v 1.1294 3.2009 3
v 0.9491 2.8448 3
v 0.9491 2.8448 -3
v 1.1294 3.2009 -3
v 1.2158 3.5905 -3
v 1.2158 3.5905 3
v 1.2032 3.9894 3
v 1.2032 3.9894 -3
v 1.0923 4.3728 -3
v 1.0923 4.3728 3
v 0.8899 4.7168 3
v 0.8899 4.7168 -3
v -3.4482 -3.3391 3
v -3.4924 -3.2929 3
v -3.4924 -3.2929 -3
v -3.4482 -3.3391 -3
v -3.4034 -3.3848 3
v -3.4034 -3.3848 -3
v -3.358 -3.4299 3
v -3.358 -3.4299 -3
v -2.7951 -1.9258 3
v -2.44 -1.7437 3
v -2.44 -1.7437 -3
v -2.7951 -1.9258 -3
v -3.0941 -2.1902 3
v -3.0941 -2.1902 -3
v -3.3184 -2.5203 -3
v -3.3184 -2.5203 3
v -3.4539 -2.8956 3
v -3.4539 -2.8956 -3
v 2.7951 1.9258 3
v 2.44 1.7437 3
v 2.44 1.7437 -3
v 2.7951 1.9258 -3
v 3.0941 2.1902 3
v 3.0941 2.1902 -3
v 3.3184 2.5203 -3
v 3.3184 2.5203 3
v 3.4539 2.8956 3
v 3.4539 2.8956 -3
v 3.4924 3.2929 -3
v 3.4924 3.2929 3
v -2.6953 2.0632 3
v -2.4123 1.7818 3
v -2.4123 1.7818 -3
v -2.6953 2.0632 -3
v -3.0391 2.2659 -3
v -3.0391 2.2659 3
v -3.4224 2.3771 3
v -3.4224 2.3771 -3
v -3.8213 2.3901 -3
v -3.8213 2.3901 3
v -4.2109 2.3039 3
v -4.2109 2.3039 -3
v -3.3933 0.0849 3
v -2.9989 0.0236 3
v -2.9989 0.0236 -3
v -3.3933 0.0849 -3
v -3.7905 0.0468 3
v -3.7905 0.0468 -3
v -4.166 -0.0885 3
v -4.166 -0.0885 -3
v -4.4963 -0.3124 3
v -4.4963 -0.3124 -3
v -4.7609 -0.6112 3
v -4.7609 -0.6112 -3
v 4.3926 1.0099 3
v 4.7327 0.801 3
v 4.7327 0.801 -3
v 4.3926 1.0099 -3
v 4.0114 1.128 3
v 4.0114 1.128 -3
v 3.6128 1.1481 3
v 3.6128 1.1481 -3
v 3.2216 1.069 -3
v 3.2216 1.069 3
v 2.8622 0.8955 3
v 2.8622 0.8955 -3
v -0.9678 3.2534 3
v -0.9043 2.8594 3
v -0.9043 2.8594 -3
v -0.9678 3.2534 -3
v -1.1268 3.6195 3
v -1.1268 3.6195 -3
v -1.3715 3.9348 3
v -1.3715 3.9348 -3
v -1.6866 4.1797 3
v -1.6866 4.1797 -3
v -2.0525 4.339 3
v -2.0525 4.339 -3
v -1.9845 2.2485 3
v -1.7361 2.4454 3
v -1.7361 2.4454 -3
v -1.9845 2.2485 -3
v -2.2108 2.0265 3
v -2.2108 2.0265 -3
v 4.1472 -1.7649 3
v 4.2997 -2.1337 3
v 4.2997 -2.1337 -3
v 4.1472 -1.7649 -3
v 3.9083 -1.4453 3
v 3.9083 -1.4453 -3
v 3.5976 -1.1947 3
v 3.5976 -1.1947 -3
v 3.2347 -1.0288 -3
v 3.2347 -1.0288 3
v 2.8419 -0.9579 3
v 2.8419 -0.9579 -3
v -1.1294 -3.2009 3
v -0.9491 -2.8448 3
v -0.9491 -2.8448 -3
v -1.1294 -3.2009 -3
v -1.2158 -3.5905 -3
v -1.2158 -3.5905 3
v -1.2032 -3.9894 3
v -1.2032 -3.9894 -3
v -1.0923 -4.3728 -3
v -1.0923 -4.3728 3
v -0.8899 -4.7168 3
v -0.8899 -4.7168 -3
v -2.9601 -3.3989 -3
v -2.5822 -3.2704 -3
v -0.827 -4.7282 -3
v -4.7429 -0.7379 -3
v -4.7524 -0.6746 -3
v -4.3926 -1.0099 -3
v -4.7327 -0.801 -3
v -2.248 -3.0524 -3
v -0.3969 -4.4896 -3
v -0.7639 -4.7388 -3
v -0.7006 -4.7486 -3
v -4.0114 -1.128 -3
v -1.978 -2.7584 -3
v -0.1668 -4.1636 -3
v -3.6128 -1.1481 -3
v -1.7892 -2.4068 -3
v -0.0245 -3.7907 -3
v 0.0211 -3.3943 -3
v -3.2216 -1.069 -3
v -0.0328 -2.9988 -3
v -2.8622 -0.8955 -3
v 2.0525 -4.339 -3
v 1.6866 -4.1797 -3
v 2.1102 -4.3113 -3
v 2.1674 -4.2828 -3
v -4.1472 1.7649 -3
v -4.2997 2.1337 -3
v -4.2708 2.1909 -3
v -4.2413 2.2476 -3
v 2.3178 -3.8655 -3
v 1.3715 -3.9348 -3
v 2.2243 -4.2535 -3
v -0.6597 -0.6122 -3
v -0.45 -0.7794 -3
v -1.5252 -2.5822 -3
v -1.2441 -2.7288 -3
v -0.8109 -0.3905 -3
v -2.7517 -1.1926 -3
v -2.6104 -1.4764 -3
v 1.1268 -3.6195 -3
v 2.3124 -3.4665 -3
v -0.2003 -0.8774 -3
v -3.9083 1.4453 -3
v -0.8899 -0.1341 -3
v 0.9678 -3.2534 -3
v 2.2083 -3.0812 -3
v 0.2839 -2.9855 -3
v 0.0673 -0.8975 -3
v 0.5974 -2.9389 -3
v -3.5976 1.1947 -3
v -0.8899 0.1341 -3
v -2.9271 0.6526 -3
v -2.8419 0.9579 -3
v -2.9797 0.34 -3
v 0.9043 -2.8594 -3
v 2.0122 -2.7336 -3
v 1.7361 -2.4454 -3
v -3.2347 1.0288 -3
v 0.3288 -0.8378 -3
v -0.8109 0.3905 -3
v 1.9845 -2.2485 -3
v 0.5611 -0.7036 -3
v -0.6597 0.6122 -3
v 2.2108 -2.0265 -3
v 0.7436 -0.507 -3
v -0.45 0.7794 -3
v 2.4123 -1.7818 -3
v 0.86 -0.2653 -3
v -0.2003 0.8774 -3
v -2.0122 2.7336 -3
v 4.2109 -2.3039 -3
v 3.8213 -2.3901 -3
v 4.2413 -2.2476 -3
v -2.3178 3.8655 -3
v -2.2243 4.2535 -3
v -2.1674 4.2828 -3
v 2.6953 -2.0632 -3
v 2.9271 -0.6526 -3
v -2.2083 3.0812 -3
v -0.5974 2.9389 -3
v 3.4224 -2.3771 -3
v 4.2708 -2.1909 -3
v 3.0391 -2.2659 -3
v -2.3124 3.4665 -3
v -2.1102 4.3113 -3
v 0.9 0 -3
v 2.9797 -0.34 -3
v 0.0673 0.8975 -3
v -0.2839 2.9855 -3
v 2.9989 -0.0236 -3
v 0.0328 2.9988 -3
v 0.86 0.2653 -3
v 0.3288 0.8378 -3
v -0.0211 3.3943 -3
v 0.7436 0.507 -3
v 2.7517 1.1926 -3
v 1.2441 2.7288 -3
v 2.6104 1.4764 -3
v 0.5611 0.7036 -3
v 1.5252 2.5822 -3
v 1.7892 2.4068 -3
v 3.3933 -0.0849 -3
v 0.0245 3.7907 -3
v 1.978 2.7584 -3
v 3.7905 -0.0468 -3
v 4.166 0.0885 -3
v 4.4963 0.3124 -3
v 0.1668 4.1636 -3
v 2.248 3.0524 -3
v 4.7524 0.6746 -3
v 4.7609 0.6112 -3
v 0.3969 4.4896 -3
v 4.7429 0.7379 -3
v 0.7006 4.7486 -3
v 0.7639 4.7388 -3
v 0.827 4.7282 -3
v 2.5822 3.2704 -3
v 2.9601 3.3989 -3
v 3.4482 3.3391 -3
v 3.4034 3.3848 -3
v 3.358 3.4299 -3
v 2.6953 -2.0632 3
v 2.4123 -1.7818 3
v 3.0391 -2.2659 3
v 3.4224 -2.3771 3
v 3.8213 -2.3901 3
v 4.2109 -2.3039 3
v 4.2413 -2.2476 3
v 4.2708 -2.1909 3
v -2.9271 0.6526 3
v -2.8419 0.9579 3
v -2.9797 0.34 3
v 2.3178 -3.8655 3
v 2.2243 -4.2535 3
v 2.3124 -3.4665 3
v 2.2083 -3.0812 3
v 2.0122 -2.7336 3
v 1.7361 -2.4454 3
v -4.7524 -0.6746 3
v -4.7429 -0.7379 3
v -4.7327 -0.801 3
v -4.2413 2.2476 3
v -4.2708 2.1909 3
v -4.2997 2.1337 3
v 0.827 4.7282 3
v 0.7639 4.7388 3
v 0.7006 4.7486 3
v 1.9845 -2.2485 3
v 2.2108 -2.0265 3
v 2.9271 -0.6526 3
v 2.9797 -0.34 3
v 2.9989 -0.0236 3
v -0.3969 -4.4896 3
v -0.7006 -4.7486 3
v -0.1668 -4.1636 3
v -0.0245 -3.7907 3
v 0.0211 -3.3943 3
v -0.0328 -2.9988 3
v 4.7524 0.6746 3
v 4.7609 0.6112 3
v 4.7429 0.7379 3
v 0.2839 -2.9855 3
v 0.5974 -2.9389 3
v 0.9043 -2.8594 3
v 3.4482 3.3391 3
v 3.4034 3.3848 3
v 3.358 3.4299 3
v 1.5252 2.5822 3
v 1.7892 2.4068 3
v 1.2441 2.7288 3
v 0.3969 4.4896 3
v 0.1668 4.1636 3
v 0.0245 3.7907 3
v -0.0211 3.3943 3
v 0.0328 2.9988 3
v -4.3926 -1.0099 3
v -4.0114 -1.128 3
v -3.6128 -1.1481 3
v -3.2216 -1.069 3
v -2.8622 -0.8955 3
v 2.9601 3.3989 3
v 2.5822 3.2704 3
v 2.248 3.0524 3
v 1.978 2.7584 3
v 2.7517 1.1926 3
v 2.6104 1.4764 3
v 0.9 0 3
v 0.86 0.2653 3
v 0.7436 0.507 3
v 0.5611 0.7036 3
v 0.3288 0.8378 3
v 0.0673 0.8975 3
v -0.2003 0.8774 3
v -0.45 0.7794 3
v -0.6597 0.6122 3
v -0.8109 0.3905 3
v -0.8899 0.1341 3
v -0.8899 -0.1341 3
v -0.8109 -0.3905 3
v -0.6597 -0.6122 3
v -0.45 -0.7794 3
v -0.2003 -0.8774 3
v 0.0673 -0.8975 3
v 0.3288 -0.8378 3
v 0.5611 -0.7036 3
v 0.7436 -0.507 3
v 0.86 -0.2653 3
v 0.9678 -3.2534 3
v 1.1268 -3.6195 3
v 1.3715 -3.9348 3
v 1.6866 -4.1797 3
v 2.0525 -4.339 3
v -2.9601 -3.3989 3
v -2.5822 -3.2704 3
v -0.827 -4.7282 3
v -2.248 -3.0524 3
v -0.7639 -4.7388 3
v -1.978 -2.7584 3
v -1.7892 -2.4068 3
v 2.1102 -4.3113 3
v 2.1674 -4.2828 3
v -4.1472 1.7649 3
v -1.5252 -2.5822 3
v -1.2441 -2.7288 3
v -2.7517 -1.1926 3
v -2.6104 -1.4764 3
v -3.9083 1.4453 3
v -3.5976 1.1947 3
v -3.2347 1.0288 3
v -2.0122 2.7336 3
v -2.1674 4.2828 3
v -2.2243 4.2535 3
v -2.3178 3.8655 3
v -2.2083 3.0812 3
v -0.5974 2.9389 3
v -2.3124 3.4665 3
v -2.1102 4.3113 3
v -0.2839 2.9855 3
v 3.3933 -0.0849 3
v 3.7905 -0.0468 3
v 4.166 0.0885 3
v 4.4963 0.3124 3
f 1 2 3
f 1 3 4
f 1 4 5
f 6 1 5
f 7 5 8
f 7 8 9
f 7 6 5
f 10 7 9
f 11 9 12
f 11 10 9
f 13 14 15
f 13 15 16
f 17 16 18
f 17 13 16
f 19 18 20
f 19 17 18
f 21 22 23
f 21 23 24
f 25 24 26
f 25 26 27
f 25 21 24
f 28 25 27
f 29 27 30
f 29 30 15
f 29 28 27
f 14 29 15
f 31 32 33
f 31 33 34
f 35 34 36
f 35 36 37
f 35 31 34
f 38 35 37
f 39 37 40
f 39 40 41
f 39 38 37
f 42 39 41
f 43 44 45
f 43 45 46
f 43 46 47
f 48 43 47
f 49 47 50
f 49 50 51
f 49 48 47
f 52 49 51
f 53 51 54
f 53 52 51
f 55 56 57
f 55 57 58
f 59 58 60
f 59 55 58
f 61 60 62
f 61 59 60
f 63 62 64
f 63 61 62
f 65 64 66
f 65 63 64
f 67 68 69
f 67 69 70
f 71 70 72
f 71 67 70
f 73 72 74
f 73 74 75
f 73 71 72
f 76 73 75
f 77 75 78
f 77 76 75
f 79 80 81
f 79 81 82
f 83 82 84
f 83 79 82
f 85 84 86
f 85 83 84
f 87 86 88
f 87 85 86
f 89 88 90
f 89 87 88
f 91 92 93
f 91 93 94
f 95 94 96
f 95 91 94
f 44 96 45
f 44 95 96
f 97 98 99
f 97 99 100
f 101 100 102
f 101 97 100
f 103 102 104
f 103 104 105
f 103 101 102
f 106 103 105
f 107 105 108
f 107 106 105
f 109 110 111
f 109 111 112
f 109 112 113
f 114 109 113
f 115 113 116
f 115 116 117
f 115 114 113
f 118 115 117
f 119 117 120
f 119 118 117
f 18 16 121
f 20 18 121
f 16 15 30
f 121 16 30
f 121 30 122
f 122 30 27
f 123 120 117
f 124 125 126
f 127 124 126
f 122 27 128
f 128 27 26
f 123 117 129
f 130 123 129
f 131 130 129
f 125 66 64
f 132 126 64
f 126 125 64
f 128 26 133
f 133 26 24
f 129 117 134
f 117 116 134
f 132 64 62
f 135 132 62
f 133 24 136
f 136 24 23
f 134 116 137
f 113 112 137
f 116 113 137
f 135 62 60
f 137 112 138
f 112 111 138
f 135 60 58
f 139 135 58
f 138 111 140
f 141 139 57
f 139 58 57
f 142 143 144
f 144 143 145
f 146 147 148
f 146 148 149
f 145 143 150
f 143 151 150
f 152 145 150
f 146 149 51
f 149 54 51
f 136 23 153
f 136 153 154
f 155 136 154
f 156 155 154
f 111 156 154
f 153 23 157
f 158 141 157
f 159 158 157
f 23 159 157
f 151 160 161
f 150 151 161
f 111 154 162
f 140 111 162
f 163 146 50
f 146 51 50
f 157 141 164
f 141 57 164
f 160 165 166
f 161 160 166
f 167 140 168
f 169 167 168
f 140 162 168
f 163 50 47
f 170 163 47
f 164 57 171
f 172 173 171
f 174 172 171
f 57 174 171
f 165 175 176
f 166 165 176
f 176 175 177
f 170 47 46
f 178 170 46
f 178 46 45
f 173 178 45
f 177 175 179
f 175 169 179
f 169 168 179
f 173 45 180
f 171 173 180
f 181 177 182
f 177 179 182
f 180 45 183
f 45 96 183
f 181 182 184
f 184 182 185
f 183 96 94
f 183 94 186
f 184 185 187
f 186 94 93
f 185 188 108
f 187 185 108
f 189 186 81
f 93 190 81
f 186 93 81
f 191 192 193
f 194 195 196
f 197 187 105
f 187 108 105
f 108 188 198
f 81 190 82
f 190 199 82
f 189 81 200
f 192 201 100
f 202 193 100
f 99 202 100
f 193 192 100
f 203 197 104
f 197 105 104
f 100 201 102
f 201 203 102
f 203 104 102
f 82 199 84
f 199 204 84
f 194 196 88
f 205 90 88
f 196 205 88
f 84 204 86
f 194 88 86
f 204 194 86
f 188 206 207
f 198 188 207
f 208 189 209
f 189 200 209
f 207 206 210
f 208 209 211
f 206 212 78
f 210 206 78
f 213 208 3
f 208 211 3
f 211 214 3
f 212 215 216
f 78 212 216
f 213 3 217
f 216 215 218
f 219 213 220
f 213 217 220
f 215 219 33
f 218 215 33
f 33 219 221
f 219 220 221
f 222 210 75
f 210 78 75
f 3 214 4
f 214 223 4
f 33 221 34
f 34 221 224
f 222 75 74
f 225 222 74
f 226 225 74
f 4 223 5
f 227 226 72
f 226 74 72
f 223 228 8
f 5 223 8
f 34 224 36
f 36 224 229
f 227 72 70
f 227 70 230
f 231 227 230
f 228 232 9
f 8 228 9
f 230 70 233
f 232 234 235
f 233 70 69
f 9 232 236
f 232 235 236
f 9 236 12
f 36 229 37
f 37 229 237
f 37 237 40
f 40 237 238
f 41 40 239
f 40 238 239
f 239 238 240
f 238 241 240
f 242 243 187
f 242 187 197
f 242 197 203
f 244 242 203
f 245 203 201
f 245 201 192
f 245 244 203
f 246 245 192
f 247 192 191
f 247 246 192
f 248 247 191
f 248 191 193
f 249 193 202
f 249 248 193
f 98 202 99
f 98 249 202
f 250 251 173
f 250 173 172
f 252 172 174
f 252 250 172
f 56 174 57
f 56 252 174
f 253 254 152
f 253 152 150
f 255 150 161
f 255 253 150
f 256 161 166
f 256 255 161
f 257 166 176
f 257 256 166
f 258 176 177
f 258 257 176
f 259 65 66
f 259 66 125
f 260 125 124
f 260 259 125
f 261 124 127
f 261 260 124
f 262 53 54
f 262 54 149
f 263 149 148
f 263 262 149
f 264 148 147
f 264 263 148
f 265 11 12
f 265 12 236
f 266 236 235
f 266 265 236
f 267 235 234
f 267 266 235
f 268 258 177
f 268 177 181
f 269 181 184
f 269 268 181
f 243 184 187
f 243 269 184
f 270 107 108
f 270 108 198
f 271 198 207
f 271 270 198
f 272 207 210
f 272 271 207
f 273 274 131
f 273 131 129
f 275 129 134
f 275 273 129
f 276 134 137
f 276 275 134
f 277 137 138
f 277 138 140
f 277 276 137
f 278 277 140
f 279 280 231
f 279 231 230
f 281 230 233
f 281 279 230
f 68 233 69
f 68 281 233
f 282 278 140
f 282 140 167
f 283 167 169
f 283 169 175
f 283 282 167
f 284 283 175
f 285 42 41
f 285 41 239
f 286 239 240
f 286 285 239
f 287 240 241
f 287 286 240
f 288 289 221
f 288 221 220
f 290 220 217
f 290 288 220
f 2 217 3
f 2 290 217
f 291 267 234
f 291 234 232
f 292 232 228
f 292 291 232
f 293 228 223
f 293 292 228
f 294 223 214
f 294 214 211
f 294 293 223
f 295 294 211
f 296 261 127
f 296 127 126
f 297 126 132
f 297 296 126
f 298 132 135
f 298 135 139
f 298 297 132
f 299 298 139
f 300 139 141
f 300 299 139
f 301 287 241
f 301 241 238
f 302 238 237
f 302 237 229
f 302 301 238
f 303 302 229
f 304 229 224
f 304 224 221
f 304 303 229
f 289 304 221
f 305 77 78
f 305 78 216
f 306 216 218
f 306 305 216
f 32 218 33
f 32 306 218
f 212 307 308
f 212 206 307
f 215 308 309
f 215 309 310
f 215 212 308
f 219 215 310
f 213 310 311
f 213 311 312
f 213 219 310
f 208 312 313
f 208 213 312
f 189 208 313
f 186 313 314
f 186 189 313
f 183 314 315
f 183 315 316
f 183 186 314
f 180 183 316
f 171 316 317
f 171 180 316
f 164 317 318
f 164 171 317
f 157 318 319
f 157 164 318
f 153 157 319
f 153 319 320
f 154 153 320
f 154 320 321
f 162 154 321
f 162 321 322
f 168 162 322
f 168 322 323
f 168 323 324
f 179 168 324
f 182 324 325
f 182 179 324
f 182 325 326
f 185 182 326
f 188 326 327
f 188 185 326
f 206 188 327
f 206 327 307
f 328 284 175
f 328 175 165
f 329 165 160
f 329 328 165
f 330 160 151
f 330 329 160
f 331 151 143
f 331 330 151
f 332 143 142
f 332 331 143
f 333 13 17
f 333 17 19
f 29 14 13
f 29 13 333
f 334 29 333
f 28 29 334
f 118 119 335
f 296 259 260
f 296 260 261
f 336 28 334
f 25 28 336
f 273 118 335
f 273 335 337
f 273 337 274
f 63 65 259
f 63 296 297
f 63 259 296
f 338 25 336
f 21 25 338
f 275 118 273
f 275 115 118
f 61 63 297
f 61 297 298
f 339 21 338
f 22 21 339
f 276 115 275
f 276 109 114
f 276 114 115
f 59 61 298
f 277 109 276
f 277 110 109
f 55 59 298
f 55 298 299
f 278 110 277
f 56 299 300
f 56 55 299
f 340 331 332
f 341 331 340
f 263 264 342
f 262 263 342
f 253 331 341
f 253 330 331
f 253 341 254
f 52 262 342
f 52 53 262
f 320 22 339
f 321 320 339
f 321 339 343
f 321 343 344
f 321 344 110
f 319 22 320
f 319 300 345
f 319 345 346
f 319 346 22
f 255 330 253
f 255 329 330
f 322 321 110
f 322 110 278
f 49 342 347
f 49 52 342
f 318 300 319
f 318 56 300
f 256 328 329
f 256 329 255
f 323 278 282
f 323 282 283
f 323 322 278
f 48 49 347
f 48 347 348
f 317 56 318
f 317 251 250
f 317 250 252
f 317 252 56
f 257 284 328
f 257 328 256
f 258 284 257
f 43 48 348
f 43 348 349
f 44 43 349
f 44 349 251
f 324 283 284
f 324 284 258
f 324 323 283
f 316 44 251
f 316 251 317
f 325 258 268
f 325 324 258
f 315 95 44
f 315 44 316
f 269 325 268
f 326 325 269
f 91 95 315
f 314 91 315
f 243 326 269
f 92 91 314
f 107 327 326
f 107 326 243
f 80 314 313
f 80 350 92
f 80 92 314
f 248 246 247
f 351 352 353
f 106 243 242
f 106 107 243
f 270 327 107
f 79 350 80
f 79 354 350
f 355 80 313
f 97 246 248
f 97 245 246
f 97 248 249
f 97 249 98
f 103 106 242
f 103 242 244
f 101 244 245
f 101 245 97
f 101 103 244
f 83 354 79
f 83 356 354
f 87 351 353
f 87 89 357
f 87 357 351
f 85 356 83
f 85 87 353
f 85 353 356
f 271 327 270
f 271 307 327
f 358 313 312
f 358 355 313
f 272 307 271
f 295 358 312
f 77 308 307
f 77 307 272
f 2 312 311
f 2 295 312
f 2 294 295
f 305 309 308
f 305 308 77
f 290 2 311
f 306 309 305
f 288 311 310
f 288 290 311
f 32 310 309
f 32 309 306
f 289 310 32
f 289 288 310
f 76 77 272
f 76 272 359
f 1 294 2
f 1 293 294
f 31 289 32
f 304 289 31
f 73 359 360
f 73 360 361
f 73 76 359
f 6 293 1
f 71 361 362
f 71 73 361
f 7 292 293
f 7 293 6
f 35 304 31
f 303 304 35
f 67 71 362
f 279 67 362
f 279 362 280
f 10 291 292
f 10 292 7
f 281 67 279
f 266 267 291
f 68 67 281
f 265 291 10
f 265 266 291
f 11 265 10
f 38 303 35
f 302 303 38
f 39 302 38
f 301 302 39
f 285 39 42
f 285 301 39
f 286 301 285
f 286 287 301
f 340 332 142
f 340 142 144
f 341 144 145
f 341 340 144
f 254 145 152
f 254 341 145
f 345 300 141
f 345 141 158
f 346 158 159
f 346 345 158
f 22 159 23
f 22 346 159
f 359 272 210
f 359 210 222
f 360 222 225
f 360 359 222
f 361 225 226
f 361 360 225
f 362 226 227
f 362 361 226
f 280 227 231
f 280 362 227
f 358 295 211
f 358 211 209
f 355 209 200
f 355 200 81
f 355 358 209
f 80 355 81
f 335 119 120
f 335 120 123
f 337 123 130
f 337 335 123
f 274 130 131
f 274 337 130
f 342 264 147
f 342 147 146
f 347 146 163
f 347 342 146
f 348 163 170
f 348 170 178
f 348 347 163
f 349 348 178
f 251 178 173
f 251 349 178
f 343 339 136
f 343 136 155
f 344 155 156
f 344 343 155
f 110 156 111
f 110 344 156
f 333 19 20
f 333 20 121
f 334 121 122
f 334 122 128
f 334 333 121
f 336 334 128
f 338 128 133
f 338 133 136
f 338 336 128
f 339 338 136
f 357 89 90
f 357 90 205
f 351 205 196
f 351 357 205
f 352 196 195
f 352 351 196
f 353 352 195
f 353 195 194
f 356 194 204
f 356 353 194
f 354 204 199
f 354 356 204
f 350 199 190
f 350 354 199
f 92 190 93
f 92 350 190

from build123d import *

# Parameters (mm, degrees)
SKETCH1_R           = 6
SKETCH1_R_2         = 0.9
BOSS_EXTRUDE1_DEPTH = 3
SKETCH2_R           = 6
CUT_EXTRUDE1_DEPTH  = 11.392304845


with BuildPart() as part:
    # Sketch1 → Boss-Extrude1 (new, symmetric)
    with BuildSketch(Plane.XY):
        Circle(SKETCH1_R)
        Circle(SKETCH1_R_2, mode=Mode.SUBTRACT)
    extrude(amount=BOSS_EXTRUDE1_DEPTH, both=True)

    # Sketch2 → Cut-Extrude1 (cut, through all)
    with BuildSketch(Plane.XY.offset(3)):
        Circle(SKETCH2_R)
        with BuildLine():
            ThreePointArc((-0.904303163, 2.859411966), (-1.23929318, 3.784776039), (-2.052505646, 4.339034521))
            ThreePointArc((-2.052505646, 4.339034521), (-2.138842368, 4.297133152), (-2.224324134, 4.253514094))
            ThreePointArc((-2.224324134, 4.253514094), (-2.272407373, 3.270556831), (-1.736096974, 2.44539737))
            ThreePointArc((-1.736096974, 2.44539737), (-2.100579038, 2.140459929), (-2.412316811, 1.781776811))
            ThreePointArc((-2.412316811, 1.781776811), (-3.227244783, 2.333509881), (-4.210932449, 2.303920118))
            ThreePointArc((-4.210932449, 2.303920118), (-4.256151318, 2.219273746), (-4.29966888, 2.133740266))
            ThreePointArc((-4.29966888, 2.133740266), (-3.760801254, 1.310248516), (-2.841900466, 0.957915832))
            ThreePointArc((-2.841900466, 0.957915832), (-2.957534919, 0.496979078), (-2.998907428, 0.023563475))
            ThreePointArc((-2.998907428, 0.023563475), (-3.982498568, -0.009077739), (-4.760926181, -0.611213463))
            ThreePointArc((-4.760926181, -0.611213463), (-4.747755125, -0.706272801), (-4.732686255, -0.801049821))
            ThreePointArc((-4.732686255, -0.801049821), (-3.812696882, -1.150530198), (-2.862194572, -0.895456995))
            ThreePointArc((-2.862194572, -0.895456995), (-2.684812984, -1.336330888), (-2.440017337, -1.743650307))
            ThreePointArc((-2.440017337, -1.743650307), (-3.216573261, -2.348197971), (-3.49240793, -3.292884275))
            ThreePointArc((-3.49240793, -3.292884275), (-3.425877845, -3.362047143), (-3.357978338, -3.429866103))
            ThreePointArc((-3.357978338, -3.429866103), (-2.408271889, -3.171845481), (-1.789227635, -2.406795685))
            ThreePointArc((-1.789227635, -2.406795685), (-1.386583742, -2.659207876), (-0.949123556, -2.844848937))
            ThreePointArc((-0.949123556, -2.844848937), (-1.222026295, -3.79038639), (-0.889908552, -4.716785215))
            ThreePointArc((-0.889908552, -4.716785215), (-0.795431669, -4.733633748), (-0.700636829, -4.74859011))
            ThreePointArc((-0.700636829, -4.74859011), (-0.083968889, -3.981623598), (-0.032836554, -2.998820228))
            ThreePointArc((-0.032836554, -2.998820228), (0.44127336, -2.966357838), (0.904303163, -2.859411966))
            ThreePointArc((0.904303163, -2.859411966), (1.23929318, -3.784776039), (2.052505646, -4.339034521))
            ThreePointArc((2.052505646, -4.339034521), (2.138842368, -4.297133152), (2.224324134, -4.253514094))
            ThreePointArc((2.224324134, -4.253514094), (2.272407373, -3.270556831), (1.736096974, -2.44539737))
            ThreePointArc((1.736096974, -2.44539737), (2.100579038, -2.140459929), (2.412316811, -1.781776811))
            ThreePointArc((2.412316811, -1.781776811), (3.227244783, -2.333509881), (4.210932449, -2.303920118))
            ThreePointArc((4.210932449, -2.303920118), (4.256151318, -2.219273746), (4.29966888, -2.133740266))
            ThreePointArc((4.29966888, -2.133740266), (3.760801254, -1.310248516), (2.841900466, -0.957915832))
            ThreePointArc((2.841900466, -0.957915832), (2.957534919, -0.496979078), (2.998907428, -0.023563475))
            ThreePointArc((2.998907428, -0.023563475), (3.982498568, 0.009077739), (4.760926181, 0.611213463))
            ThreePointArc((4.760926181, 0.611213463), (4.747755125, 0.706272801), (4.732686255, 0.801049821))
            ThreePointArc((4.732686255, 0.801049821), (3.812696882, 1.150530198), (2.862194572, 0.895456995))
            ThreePointArc((2.862194572, 0.895456995), (2.684812984, 1.336330888), (2.440017337, 1.743650307))
            ThreePointArc((2.440017337, 1.743650307), (3.216573261, 2.348197971), (3.49240793, 3.292884275))
            ThreePointArc((3.49240793, 3.292884275), (3.425877845, 3.362047143), (3.357978338, 3.429866103))
            ThreePointArc((3.357978338, 3.429866103), (2.408271889, 3.171845481), (1.789227635, 2.406795685))
            ThreePointArc((1.789227635, 2.406795685), (1.386583742, 2.659207876), (0.949123556, 2.844848937))
            ThreePointArc((0.949123556, 2.844848937), (1.222026295, 3.79038639), (0.889908552, 4.716785215))
            ThreePointArc((0.889908552, 4.716785215), (0.795431669, 4.733633748), (0.700636829, 4.74859011))
            ThreePointArc((0.700636829, 4.74859011), (0.083968889, 3.981623598), (0.032836554, 2.998820228))
            ThreePointArc((0.032836554, 2.998820228), (-0.44127336, 2.966357838), (-0.904303163, 2.859411966))
        make_face(mode=Mode.SUBTRACT)
    extrude(amount=-CUT_EXTRUDE1_DEPTH, mode=Mode.SUBTRACT)


solid = part.part
